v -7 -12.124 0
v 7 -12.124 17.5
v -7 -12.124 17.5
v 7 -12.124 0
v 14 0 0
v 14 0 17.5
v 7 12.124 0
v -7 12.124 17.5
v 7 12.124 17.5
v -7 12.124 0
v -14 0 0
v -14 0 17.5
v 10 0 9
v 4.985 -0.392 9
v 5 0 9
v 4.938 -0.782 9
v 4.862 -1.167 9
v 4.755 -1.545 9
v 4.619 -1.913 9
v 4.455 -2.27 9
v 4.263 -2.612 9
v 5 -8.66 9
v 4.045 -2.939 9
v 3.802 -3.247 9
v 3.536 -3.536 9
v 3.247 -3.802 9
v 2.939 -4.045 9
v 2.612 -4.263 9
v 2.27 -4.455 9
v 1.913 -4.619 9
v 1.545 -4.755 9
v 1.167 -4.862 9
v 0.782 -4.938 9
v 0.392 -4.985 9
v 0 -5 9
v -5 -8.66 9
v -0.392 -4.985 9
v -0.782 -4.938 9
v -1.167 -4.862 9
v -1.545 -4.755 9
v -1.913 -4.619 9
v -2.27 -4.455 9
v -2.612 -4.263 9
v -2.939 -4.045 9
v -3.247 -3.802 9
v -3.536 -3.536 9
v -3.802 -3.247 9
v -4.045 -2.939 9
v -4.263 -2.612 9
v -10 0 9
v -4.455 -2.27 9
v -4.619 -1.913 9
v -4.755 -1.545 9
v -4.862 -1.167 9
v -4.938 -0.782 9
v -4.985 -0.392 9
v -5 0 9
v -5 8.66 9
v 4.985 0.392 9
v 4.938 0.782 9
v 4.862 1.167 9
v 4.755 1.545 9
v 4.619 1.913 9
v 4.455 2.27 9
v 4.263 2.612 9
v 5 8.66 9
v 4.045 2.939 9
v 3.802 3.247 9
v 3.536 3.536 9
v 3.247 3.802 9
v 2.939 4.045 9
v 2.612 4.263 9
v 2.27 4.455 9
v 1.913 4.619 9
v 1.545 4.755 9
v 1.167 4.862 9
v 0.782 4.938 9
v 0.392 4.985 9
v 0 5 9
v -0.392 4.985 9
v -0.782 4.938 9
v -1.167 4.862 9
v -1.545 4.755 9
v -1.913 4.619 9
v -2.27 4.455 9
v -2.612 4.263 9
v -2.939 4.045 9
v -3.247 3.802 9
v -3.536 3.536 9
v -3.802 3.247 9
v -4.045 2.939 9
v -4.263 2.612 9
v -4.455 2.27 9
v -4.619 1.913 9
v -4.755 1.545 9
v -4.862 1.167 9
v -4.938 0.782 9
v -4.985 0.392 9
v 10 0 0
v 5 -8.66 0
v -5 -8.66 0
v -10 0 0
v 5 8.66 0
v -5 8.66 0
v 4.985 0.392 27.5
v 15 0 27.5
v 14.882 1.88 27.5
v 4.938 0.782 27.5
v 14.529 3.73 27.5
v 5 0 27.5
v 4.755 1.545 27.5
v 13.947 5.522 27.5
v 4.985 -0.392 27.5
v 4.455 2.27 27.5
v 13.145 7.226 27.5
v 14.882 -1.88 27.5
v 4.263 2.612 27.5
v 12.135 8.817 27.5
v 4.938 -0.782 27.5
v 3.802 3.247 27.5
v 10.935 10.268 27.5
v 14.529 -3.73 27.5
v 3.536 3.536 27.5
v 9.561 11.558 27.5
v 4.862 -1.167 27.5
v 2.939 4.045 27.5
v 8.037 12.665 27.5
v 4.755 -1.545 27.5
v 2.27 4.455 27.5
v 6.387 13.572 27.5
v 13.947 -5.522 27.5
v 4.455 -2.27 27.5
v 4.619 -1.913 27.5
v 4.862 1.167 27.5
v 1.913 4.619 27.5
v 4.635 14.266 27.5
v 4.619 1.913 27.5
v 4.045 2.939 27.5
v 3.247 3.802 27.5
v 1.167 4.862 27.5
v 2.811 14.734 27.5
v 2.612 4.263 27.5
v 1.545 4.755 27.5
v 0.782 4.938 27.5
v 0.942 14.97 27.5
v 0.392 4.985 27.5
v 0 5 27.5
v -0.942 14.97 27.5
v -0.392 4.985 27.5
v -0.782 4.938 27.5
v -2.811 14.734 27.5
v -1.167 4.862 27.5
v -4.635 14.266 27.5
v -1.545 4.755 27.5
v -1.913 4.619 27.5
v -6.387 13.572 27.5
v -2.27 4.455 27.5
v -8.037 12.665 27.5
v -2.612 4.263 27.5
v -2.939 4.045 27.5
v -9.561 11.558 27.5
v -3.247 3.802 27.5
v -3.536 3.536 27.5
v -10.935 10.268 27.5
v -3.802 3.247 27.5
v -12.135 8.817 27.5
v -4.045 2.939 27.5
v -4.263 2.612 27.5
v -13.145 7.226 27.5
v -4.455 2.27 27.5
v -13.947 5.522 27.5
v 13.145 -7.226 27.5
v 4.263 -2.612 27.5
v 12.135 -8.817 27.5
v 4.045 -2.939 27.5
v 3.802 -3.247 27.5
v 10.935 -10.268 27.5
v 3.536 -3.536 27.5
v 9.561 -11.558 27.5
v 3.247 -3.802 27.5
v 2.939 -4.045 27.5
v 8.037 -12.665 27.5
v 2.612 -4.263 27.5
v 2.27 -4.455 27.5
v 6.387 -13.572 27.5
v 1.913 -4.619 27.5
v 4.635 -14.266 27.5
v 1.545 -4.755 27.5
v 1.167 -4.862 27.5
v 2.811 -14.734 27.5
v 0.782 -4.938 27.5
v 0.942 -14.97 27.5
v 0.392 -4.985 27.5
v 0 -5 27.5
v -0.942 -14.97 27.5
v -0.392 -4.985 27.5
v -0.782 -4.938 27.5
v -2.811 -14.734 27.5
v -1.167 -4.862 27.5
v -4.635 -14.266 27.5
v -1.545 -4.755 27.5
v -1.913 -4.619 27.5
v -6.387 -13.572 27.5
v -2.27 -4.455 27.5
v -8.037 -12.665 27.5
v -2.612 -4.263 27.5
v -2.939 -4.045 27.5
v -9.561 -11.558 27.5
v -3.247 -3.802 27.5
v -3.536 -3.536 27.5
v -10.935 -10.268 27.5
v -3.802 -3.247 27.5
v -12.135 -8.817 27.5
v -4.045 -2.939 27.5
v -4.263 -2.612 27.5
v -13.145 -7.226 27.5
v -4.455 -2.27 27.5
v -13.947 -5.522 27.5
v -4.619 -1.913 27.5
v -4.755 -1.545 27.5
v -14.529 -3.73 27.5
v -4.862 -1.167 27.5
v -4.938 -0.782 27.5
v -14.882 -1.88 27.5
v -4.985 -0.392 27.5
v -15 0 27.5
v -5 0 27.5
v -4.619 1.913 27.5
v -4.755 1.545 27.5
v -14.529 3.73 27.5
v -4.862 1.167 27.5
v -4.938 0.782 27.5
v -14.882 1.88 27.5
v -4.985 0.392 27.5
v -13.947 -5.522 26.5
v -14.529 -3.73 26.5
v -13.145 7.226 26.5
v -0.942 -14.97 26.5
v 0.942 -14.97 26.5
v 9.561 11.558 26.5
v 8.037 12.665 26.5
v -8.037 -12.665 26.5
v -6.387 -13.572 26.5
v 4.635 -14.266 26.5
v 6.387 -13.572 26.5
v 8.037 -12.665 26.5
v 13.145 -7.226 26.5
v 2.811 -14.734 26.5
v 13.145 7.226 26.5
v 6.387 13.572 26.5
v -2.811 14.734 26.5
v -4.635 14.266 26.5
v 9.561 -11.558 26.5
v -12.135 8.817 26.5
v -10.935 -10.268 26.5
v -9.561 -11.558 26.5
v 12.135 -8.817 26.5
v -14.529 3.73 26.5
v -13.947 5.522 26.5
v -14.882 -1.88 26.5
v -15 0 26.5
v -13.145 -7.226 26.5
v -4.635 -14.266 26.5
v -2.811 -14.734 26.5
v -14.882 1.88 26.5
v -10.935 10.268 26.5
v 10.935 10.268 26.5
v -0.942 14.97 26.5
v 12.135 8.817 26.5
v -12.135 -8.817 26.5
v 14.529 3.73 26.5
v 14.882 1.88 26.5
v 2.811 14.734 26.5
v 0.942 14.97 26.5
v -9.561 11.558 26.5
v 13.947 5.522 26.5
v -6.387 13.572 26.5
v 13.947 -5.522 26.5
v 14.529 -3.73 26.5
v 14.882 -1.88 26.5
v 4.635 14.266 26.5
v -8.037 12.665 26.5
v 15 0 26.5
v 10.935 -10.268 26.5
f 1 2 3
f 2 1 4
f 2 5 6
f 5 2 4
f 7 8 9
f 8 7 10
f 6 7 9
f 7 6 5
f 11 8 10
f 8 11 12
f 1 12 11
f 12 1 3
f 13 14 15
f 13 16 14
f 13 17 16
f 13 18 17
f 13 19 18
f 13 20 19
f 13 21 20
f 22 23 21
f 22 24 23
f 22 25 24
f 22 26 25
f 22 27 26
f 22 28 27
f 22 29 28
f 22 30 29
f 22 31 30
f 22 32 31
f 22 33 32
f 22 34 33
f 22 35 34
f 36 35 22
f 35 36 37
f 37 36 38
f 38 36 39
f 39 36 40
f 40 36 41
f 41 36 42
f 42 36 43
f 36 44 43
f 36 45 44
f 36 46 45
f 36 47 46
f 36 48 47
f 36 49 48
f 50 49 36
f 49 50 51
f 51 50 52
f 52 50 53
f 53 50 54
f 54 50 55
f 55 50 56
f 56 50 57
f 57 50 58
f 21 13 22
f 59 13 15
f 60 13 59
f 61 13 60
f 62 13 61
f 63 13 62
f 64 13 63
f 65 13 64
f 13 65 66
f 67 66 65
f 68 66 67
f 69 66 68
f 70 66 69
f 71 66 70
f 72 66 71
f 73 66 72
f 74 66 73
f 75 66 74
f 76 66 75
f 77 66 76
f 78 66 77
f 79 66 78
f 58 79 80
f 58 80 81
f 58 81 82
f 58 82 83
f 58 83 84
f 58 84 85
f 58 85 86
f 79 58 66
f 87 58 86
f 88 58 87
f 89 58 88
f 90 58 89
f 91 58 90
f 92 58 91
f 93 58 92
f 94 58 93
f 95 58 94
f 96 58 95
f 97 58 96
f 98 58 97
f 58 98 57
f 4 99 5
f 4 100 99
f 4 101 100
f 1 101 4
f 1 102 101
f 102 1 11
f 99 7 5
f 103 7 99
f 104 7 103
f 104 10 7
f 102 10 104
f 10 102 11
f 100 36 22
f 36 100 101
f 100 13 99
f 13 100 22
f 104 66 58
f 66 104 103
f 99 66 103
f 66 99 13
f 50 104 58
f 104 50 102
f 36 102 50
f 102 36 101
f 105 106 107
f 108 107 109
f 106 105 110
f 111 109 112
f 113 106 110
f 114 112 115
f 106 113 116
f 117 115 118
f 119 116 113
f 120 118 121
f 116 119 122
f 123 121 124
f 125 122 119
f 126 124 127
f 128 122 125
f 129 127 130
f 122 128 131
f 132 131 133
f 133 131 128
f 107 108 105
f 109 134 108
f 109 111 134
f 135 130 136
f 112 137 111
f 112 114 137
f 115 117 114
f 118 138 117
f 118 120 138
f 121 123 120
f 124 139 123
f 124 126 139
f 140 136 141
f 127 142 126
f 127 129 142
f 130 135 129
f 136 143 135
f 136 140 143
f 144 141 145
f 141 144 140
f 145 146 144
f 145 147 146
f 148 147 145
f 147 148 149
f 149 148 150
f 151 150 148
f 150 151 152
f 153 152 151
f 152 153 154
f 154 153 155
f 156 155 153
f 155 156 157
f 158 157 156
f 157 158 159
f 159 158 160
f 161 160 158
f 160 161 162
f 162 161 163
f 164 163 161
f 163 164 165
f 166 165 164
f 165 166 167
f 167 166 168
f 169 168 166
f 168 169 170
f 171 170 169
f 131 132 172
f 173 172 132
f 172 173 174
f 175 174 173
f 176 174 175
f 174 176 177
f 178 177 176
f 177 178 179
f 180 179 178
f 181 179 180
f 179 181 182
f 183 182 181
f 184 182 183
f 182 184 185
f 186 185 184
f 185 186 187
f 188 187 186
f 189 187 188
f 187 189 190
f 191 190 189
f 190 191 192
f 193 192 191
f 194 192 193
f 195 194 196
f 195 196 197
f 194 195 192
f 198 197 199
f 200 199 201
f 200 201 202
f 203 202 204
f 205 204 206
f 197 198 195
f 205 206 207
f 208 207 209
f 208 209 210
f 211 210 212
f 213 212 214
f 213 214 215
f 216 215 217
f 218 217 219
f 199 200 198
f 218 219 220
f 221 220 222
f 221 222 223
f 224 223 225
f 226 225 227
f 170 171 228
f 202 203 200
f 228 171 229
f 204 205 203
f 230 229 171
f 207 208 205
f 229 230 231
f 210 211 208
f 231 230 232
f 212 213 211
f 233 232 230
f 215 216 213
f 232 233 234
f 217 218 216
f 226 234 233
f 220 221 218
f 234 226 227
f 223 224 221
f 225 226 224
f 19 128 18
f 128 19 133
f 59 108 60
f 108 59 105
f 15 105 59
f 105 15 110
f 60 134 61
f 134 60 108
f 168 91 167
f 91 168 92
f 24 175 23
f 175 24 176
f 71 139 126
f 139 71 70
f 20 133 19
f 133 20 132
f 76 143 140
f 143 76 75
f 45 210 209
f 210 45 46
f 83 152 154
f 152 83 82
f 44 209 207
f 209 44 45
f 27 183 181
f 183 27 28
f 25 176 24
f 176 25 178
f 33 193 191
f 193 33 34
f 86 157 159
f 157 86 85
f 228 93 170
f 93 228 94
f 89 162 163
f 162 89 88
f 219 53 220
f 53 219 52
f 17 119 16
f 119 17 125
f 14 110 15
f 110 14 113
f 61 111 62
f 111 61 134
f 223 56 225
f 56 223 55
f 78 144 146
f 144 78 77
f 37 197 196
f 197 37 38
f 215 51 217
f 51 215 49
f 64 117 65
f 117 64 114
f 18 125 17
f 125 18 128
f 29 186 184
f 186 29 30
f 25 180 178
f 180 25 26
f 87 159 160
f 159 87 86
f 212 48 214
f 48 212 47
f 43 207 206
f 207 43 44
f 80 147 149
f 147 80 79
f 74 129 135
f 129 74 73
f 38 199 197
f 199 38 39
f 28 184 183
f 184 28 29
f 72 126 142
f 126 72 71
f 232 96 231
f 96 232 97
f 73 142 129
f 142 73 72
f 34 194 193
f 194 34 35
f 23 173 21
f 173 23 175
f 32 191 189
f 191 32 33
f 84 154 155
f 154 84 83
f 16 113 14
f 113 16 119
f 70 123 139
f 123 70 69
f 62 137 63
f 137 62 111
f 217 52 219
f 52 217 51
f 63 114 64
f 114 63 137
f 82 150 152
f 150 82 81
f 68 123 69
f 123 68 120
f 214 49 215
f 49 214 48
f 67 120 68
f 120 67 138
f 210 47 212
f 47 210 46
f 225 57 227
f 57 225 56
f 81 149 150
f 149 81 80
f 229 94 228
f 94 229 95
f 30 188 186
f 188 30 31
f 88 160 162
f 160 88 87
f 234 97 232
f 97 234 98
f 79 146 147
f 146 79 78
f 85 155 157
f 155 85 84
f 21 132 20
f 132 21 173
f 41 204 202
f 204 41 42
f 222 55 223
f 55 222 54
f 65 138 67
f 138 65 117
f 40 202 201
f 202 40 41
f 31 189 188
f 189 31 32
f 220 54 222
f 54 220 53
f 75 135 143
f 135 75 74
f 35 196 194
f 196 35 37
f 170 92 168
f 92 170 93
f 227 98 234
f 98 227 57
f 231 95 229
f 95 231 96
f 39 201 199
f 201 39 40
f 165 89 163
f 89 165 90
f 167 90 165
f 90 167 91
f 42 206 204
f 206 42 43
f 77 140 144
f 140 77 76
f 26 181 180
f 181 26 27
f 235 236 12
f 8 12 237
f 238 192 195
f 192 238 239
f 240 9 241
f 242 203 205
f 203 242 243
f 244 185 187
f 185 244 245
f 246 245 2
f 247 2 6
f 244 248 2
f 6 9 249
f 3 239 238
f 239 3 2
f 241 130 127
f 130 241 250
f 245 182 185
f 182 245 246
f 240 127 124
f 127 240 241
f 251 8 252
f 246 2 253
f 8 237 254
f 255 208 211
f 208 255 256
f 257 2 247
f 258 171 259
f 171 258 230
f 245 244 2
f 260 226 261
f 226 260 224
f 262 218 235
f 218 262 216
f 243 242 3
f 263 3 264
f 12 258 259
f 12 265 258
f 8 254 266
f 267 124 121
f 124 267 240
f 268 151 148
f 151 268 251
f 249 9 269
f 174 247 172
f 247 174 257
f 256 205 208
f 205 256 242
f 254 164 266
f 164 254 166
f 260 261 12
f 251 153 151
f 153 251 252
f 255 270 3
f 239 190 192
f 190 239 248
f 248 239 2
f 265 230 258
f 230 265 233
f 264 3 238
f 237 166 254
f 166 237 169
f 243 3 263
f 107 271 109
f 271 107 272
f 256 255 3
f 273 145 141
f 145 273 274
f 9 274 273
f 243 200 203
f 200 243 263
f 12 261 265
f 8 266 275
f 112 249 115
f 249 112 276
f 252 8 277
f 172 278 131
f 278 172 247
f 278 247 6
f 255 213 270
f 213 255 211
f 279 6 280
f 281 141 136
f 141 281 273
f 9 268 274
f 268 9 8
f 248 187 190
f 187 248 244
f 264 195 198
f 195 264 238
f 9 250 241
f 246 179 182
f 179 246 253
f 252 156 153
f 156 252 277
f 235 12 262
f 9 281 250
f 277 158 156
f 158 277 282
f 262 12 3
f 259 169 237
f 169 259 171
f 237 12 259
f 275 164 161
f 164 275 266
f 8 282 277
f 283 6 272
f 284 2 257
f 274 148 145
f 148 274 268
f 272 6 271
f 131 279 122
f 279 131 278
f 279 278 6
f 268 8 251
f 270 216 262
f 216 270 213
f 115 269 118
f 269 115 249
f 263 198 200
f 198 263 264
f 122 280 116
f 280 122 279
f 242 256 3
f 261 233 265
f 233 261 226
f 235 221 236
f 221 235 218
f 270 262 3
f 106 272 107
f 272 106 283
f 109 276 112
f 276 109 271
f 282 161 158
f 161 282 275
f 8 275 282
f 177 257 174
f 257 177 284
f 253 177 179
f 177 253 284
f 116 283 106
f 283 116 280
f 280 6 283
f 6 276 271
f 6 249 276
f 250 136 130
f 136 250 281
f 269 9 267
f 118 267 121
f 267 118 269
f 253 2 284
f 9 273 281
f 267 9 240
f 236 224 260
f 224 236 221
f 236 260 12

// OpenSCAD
polomerMatka = 20/2;
vyskaMatka = 9;
okraj=4;
vyskaMezi = 18.5;
polomerSroubu = 10/2;
difference(){
cylinder(r=polomerMatka+okraj, h=vyskaMatka, $fn = 6);
cylinder(r=polomerMatka, h = vyskaMatka, $fn = 6);
}
translate([0,0,vyskaMatka])
difference(){

cylinder(r=polomerMatka+okraj, h = vyskaMezi , $fn = 6);
cylinder(r=polomerSroubu, h = vyskaMezi, $fn = 80);
}


horniR = 15;
difference(){
hull(){
translate([0,0,vyskaMatka+vyskaMezi-10])
cylinder(r=polomerMatka+okraj, h = 1, $fn = 6);
translate([0,0,vyskaMatka+vyskaMezi-1])
cylinder(r=horniR, h = 1, $fn = 50);
}
translate([0,0,vyskaMatka])
cylinder(r=polomerSroubu, h = vyskaMezi, $fn = 80);
}
